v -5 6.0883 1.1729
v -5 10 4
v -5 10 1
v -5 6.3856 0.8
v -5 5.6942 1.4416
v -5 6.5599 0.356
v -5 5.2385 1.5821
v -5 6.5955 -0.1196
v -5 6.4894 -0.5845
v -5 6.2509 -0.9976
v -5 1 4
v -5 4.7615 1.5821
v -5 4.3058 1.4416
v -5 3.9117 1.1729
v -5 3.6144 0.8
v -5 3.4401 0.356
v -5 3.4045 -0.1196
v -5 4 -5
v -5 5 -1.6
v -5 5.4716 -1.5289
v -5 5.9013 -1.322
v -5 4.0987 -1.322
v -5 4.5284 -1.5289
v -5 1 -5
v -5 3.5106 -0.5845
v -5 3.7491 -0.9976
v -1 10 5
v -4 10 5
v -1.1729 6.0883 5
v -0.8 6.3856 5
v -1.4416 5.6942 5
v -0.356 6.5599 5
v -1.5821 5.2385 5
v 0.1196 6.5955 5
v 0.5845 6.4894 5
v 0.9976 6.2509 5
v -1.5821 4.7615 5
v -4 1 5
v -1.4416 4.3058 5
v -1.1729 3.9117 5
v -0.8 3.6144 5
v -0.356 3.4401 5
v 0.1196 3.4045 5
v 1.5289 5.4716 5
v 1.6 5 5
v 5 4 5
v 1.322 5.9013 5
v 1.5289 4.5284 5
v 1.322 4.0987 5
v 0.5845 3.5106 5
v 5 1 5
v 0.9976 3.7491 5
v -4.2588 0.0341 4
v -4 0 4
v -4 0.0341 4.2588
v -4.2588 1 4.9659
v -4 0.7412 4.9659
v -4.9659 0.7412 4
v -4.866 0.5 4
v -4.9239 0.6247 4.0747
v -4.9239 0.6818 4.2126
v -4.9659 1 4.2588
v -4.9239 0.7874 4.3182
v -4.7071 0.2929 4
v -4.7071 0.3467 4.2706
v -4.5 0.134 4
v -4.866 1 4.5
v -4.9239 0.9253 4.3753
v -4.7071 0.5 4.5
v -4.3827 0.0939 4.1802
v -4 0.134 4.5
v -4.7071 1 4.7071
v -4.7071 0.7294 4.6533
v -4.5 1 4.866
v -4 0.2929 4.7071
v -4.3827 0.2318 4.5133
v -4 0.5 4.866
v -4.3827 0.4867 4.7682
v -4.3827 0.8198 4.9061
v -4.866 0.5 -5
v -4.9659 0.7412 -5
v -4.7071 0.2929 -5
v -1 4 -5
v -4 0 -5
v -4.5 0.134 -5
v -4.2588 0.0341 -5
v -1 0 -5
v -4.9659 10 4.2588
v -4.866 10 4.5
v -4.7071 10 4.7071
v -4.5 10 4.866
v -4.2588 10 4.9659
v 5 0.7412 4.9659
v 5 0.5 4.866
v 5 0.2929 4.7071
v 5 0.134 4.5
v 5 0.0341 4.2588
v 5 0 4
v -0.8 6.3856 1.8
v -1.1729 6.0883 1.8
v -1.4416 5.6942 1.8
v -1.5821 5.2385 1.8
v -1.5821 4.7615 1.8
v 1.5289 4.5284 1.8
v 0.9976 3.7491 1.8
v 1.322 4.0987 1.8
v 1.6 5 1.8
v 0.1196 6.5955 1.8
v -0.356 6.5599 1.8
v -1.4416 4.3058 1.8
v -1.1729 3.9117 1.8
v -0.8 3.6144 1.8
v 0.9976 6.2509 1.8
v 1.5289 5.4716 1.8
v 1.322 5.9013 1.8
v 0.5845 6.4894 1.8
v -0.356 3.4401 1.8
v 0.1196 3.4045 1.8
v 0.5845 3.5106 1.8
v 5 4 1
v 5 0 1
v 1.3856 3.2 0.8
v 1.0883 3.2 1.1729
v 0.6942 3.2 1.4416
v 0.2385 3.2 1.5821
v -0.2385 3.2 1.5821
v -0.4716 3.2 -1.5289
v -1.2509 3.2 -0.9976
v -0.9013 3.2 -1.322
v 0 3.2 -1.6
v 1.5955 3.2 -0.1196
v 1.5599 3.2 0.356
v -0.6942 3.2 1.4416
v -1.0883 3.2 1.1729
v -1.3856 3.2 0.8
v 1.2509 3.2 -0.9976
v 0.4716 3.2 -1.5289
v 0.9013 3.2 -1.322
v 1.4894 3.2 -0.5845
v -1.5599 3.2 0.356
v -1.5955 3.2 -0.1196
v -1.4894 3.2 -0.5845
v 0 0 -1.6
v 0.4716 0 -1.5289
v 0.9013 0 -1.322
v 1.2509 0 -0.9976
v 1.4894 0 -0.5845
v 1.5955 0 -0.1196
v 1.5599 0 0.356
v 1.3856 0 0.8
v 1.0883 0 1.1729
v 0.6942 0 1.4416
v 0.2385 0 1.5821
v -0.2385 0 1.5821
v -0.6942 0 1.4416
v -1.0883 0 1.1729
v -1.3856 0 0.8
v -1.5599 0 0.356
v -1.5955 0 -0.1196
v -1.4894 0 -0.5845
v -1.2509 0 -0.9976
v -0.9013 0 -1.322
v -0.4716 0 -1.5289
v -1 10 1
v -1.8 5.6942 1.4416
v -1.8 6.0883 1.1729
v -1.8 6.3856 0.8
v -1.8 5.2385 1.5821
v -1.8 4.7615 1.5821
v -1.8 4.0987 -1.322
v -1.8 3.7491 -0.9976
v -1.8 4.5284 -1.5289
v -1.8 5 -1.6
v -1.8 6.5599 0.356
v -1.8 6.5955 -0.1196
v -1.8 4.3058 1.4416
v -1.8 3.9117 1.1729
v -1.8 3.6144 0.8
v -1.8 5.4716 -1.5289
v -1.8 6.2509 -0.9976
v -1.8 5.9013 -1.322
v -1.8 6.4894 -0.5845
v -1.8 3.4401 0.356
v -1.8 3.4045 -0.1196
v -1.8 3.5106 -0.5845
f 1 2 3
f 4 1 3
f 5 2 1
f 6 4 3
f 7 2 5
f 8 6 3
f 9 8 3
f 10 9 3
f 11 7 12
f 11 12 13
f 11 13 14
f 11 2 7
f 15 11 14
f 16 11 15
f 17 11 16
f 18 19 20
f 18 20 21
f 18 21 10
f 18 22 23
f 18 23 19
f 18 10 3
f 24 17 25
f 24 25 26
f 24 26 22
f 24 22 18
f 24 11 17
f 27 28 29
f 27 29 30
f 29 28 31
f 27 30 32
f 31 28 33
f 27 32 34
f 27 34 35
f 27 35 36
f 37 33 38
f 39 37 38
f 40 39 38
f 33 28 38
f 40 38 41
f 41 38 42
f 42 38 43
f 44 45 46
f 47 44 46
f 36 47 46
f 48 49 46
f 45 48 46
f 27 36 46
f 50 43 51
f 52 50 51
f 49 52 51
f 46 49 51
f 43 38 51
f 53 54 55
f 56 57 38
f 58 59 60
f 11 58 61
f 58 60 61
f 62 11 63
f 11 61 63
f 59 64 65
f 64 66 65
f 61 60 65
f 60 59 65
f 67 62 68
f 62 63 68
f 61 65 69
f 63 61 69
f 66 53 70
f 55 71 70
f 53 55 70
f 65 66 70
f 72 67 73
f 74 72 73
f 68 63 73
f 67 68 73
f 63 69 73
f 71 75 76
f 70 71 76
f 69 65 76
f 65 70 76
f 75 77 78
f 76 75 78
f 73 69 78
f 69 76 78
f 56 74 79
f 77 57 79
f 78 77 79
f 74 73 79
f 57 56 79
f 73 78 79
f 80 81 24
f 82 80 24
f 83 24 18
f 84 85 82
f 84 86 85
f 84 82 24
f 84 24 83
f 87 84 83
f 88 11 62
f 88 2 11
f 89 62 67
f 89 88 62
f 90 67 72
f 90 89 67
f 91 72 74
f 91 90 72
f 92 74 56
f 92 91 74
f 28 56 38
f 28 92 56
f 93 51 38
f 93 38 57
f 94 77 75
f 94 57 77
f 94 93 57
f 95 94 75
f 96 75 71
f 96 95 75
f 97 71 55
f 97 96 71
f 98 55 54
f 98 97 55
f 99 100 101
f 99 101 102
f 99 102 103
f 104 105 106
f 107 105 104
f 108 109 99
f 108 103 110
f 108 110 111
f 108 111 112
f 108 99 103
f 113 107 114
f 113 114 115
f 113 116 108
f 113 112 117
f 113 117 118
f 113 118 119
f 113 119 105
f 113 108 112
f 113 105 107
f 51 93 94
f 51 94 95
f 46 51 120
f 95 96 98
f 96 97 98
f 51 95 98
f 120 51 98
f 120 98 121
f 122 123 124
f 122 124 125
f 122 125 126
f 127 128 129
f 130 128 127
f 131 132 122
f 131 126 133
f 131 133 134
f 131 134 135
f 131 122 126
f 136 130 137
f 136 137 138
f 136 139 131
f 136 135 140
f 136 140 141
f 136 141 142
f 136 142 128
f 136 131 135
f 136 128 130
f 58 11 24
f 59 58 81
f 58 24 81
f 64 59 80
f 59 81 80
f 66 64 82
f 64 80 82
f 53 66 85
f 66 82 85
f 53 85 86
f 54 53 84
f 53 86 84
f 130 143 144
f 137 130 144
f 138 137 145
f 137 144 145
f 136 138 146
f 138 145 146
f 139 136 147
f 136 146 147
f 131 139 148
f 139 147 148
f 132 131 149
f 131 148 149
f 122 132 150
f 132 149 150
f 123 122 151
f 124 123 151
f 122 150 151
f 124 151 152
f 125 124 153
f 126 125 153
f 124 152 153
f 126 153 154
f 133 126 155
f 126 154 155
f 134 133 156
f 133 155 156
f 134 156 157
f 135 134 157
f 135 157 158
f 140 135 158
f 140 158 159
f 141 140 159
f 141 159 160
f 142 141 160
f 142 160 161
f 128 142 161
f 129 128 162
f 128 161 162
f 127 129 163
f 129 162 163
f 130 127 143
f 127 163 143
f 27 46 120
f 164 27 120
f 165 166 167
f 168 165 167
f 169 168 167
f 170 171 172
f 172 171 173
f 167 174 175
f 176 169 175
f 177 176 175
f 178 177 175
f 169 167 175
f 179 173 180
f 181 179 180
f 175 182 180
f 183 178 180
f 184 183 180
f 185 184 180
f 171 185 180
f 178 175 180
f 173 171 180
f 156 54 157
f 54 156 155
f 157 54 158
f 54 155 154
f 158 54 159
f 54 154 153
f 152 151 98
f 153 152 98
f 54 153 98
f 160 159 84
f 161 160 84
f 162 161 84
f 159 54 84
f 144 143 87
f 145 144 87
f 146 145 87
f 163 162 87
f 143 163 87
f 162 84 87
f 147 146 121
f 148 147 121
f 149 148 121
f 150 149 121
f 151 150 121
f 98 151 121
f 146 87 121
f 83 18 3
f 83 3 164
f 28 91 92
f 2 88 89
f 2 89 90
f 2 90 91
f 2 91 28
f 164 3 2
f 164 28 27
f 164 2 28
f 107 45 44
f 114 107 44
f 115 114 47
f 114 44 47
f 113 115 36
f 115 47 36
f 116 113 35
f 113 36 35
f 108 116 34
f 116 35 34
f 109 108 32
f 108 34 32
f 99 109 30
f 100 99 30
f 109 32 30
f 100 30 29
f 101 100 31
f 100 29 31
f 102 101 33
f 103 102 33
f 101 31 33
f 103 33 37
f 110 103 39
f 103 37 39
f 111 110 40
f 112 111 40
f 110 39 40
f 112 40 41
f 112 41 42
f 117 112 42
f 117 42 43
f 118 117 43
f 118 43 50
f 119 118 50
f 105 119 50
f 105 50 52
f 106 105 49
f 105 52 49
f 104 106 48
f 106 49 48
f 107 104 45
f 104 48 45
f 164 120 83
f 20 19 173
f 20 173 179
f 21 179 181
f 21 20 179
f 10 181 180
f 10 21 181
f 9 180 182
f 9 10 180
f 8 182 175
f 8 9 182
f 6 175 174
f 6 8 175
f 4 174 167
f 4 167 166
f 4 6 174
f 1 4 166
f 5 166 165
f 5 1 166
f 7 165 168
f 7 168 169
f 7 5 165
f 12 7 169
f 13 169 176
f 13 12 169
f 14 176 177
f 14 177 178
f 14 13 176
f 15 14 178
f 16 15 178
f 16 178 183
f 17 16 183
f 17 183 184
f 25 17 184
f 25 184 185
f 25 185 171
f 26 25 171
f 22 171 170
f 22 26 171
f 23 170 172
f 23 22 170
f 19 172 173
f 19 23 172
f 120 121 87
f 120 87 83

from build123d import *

# Parameters (mm, degrees)
SKETCH1_W           = 10
SKETCH1_H           = 10
BOSS_EXTRUDE1_DEPTH = 10
SKETCH2_R           = 1.6
CUT_EXTRUDE1_DEPTH  = 3.2
SKETCH3_R           = 1.6
CUT_EXTRUDE3_DEPTH  = 3.2
SKETCH4_R           = 1.6
CUT_EXTRUDE4_DEPTH  = 3.2
FILLET2_R           = 1
CHAMFER1_SIZE       = 6


with BuildPart() as part:
    # Sketch1 → Boss-Extrude1 (new body)
    with BuildSketch(Plane(origin=(0, 0, 0), x_dir=(1, 0, 0), z_dir=(0, 1, 0))):
        Rectangle(SKETCH1_W, SKETCH1_H)
    extrude(amount=BOSS_EXTRUDE1_DEPTH)

    # Sketch2 → Cut-Extrude1 (cut)
    with BuildSketch(Plane.XY.offset(5)):
        with Locations((0, 5)):
            Circle(SKETCH2_R)
    extrude(amount=-CUT_EXTRUDE1_DEPTH, mode=Mode.SUBTRACT)

    # Sketch3 → Cut-Extrude3 (cut)
    with BuildSketch(Plane(origin=(0, 0, 0), x_dir=(-1, 0, 0), z_dir=(0, -1, 0))):
        with Locations(Location((0, 0, 0), (0, 0, 90))):
            Circle(SKETCH3_R)
    extrude(amount=-CUT_EXTRUDE3_DEPTH, mode=Mode.SUBTRACT)

    # Sketch4 → Cut-Extrude4 (cut)
    with BuildSketch(Plane(origin=(-5, 0, 0), x_dir=(0, 0, -1), z_dir=(1, 0, 0))):
        with Locations((0, 5)):
            Circle(SKETCH4_R)
    extrude(amount=CUT_EXTRUDE4_DEPTH, mode=Mode.SUBTRACT)

    # Fillet2
    fillet2_edges = [part.edges().sort_by_distance(p)[0] for p in [
        (0, 0, 5),
        (-5, 0, 0),
        (-5, 5, 5),
    ]]
    fillet(fillet2_edges, radius=FILLET2_R)

    # Chamfer1
    chamfer1_edges = [part.edges().sort_by_distance(p)[0] for p in [
        (5, 10, 0),
        (5, 5, -5),
        (0, 10, -5),
    ]]
    chamfer(chamfer1_edges, length=CHAMFER1_SIZE)


solid = part.part
